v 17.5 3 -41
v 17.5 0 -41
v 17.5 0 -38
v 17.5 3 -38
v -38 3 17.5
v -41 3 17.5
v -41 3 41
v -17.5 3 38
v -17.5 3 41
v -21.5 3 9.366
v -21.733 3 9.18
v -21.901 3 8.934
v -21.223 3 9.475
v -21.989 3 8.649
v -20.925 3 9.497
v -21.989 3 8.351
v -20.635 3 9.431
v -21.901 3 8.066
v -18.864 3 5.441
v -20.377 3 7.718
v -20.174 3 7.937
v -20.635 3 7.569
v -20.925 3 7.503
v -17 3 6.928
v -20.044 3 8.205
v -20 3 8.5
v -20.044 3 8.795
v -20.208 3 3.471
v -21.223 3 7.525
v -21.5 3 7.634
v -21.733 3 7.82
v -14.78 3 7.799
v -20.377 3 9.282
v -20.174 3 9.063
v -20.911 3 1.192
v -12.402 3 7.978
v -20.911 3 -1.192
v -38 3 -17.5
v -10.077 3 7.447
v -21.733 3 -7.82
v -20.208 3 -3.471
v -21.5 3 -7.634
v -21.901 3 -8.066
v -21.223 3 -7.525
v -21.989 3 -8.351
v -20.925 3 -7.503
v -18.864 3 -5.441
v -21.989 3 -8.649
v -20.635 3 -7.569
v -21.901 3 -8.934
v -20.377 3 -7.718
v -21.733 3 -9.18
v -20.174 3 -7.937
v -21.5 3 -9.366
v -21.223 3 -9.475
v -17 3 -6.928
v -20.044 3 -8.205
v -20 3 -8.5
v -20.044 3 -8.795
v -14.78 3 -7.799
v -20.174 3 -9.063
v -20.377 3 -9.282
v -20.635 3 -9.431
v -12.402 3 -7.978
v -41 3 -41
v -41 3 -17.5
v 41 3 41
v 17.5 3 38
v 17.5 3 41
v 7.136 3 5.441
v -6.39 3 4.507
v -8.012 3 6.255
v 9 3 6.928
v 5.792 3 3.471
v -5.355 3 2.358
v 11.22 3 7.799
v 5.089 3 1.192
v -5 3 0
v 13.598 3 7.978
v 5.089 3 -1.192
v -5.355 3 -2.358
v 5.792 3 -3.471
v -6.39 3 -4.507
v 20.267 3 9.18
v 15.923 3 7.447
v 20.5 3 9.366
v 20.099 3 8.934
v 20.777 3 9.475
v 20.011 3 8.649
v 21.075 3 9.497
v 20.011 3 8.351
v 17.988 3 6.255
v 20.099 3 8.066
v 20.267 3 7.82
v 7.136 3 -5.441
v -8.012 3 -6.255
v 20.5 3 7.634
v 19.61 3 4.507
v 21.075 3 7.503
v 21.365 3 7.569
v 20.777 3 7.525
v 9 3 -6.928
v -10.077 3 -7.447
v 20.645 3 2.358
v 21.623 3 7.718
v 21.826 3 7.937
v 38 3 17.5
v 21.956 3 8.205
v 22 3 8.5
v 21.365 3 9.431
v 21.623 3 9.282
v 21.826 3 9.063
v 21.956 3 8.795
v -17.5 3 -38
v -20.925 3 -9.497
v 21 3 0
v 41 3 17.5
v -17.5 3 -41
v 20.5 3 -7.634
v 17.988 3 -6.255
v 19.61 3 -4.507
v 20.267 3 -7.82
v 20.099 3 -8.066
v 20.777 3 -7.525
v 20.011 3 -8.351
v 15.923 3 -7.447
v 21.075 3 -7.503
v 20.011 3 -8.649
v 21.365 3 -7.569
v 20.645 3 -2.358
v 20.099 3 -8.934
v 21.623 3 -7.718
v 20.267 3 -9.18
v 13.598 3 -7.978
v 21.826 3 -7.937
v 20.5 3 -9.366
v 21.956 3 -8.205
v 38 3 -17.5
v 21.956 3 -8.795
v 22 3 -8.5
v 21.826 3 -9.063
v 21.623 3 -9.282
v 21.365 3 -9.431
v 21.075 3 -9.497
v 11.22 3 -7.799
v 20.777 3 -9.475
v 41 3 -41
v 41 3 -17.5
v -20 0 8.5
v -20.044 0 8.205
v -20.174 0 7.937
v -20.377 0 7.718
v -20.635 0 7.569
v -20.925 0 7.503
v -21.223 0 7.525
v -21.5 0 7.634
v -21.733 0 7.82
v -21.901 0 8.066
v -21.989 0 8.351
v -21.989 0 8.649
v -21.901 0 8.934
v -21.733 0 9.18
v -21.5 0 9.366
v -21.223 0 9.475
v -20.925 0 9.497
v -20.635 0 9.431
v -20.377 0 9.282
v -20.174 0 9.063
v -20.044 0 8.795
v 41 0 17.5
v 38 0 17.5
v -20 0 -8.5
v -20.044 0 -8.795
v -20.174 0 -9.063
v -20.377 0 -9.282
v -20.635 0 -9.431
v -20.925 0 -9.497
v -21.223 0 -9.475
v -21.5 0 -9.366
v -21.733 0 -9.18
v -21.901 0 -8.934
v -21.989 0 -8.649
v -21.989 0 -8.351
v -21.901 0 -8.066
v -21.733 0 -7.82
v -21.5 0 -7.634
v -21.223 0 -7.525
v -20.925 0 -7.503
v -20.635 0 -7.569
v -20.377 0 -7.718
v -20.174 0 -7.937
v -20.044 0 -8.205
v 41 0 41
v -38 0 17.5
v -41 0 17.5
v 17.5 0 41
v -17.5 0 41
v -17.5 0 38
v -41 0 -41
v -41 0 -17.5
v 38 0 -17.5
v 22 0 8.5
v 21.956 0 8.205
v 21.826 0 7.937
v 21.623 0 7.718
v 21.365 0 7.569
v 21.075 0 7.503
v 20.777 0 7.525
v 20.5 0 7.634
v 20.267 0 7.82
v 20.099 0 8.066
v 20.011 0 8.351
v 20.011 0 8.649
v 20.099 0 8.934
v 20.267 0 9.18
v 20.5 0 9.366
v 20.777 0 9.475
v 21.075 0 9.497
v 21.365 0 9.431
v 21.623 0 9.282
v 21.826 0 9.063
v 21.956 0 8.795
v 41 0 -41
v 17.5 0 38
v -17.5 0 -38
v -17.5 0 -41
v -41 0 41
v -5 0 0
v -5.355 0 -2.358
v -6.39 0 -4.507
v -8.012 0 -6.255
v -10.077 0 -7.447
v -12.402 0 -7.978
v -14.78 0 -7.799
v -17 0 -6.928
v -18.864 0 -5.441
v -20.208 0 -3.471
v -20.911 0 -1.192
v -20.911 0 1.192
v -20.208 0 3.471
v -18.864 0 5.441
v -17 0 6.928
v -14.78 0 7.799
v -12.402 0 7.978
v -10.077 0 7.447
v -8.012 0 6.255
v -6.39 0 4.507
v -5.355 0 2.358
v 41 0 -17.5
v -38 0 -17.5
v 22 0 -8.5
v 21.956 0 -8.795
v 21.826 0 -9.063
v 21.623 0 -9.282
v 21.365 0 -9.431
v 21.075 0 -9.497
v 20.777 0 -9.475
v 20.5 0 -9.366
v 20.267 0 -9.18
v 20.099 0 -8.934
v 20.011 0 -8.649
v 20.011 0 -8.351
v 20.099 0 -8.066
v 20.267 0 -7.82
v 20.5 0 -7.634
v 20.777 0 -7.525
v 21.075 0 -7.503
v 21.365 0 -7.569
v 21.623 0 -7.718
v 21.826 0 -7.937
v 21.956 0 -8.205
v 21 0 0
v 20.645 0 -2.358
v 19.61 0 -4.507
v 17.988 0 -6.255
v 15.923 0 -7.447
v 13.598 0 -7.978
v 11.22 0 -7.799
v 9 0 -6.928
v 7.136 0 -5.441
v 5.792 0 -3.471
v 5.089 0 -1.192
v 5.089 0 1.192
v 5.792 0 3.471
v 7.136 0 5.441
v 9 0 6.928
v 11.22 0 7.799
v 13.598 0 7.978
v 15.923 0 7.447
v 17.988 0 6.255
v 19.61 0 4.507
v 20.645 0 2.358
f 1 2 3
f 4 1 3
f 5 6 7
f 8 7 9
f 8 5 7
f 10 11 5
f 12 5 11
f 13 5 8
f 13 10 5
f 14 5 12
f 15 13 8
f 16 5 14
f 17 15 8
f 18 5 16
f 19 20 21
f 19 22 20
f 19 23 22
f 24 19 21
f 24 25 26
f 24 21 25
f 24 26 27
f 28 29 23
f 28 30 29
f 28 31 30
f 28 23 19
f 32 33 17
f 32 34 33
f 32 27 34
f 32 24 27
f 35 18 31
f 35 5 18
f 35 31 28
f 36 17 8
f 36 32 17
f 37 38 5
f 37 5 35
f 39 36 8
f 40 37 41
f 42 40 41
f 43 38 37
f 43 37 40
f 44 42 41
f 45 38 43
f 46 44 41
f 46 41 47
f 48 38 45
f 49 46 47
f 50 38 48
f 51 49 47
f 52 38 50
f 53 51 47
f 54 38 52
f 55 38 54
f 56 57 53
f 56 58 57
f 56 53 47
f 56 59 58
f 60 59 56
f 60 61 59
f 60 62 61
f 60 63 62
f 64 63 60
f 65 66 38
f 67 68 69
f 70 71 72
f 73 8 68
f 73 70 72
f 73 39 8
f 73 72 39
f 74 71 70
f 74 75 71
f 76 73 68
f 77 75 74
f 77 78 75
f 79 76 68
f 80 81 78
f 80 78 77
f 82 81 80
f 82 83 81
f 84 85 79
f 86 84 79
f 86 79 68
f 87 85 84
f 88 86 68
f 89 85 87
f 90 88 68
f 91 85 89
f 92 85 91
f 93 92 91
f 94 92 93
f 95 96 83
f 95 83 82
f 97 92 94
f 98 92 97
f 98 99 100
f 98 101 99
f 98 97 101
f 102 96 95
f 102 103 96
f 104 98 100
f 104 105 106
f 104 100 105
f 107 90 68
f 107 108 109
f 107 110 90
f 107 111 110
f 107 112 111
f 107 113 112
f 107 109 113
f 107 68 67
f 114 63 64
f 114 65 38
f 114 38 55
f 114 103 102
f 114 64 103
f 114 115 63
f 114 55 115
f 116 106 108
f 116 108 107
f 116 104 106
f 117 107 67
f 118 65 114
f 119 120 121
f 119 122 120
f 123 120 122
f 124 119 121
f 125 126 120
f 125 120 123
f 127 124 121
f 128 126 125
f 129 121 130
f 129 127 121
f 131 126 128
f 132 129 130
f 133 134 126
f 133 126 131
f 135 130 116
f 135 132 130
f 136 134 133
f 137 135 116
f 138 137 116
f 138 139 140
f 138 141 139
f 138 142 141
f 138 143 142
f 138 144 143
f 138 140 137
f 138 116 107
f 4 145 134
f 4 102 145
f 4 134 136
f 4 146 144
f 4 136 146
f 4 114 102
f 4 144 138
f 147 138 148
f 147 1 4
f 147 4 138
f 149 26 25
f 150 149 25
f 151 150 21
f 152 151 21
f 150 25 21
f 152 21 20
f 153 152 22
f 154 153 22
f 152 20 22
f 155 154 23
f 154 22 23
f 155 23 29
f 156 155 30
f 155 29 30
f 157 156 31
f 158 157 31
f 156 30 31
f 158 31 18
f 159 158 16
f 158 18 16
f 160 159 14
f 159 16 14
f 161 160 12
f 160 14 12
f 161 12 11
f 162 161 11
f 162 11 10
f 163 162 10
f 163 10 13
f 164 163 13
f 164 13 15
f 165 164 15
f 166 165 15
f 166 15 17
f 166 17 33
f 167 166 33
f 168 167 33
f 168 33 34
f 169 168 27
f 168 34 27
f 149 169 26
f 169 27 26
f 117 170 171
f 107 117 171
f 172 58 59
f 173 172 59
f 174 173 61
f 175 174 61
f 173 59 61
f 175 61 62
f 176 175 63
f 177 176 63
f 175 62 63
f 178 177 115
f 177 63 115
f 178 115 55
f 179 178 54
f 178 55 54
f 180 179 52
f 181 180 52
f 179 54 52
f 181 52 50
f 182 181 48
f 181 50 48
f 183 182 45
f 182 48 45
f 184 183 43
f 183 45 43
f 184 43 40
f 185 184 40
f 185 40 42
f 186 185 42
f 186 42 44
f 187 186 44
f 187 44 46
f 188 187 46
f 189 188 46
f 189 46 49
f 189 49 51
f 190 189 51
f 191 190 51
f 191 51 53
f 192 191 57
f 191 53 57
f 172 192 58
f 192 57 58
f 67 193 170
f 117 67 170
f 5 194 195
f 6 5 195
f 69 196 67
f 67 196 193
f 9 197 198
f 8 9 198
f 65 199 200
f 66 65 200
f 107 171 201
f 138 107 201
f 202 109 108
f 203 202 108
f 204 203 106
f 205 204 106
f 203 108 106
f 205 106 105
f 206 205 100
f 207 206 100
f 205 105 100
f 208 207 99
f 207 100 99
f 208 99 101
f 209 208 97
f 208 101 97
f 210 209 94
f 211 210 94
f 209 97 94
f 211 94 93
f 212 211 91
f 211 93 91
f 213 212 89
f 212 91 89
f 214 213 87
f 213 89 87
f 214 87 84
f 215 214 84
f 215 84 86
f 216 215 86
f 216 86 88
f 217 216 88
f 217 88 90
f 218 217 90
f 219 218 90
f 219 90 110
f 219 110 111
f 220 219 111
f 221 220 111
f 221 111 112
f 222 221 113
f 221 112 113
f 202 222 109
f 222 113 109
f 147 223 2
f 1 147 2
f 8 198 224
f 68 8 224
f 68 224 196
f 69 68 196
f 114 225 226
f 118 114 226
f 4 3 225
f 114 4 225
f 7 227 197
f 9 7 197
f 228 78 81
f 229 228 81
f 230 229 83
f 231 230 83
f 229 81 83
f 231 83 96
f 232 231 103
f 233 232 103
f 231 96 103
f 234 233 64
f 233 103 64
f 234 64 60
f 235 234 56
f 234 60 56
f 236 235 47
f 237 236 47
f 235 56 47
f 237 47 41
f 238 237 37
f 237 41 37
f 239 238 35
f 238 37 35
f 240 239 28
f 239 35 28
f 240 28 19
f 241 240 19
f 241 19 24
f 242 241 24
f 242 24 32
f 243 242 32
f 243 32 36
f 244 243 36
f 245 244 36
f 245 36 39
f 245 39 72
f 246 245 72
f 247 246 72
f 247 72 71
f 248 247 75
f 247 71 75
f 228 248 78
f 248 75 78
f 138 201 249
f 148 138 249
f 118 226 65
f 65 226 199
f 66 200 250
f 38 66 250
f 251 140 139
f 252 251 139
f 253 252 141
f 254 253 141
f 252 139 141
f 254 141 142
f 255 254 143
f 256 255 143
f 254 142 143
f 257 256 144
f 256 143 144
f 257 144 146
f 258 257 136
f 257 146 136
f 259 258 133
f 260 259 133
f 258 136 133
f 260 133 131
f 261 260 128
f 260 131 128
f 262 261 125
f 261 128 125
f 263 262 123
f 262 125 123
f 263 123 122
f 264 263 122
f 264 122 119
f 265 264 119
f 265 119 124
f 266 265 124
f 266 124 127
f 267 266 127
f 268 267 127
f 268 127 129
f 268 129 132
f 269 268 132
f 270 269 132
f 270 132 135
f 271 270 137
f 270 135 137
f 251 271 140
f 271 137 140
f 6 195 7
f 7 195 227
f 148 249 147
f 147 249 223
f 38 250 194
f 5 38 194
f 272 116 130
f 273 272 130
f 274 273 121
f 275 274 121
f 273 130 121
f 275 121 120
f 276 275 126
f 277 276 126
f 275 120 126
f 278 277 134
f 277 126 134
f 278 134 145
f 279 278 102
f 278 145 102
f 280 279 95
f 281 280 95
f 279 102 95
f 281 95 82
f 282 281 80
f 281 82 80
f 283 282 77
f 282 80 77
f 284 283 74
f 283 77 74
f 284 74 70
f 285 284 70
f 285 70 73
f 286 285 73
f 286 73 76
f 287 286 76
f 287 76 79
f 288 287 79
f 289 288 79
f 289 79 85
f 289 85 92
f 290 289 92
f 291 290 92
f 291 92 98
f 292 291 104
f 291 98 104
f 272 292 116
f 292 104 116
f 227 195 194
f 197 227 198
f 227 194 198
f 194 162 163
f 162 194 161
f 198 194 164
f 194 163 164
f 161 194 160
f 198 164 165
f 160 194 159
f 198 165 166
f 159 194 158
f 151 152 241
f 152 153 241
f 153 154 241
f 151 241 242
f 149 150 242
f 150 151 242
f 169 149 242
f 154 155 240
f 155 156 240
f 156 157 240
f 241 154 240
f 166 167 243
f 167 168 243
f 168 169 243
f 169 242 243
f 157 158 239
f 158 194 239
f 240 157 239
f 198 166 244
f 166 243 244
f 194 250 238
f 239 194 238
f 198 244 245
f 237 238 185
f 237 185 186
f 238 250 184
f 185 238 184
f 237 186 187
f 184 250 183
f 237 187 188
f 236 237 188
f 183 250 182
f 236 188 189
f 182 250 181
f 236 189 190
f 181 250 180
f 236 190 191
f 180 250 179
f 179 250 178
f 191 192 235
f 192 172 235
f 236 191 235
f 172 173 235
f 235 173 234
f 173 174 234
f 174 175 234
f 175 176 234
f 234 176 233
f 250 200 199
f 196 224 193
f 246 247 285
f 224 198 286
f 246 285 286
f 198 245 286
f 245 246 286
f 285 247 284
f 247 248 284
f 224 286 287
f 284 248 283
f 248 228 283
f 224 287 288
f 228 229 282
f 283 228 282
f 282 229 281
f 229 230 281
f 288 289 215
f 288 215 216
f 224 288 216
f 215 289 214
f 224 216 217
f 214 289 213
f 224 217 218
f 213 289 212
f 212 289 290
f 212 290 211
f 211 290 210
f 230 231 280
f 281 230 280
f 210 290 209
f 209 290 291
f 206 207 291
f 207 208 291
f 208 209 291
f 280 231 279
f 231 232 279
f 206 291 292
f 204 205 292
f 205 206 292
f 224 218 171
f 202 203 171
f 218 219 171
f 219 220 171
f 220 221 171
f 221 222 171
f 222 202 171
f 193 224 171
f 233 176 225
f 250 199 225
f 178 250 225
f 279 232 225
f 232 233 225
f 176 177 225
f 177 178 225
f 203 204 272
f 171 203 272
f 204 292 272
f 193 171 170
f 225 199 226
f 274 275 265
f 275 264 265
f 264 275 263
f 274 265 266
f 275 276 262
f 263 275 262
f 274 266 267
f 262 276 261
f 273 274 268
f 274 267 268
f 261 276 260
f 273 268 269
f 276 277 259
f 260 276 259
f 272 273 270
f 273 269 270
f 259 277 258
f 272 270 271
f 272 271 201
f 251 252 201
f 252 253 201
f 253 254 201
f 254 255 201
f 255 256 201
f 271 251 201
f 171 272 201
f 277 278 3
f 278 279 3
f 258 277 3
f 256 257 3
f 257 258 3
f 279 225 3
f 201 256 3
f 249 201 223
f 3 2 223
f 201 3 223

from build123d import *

# Parameters (mm, degrees)
BOSS_EXTRUDE1_DEPTH = 3
SKETCH2_R           = 8
SKETCH2_R_2         = 1
CUT_EXTRUDE1_DEPTH  = 3


with BuildPart() as part:
    # Sketch1 → Boss-Extrude1 (new body)
    with BuildSketch(Plane(origin=(0, 0, 0), x_dir=(1, 0, 0), z_dir=(0, 1, 0))):
        Polygon((-41, -41), (-17.5, -41), (-17.5, -38), (17.5, -38), (17.5, -41), (41, -41), (41, -17.5), (38, -17.5), (38, 17.5), (41, 17.5), (41, 41), (17.5, 41), (17.5, 38), (-17.5, 38), (-17.5, 41), (-41, 41), (-41, 17.5), (-38, 17.5), (-38, -17.5), (-41, -17.5), align=None)
    extrude(amount=BOSS_EXTRUDE1_DEPTH)

    # Sketch2 → Cut-Extrude1 (cut)
    with BuildSketch(Plane(origin=(0, 3, 0), x_dir=(1, 0, 0), z_dir=(0, 1, 0))):
        with Locations((-13, 0)):
            Circle(SKETCH2_R)
        with Locations((-21, 8.5)):
            Circle(SKETCH2_R_2)
        with Locations((-21, -8.5)):
            Circle(SKETCH2_R_2)
        with Locations((21, -8.5)):
            Circle(SKETCH2_R_2)
        with Locations((21, 8.5)):
            Circle(SKETCH2_R_2)
        with Locations((13, 0)):
            Circle(SKETCH2_R)
    extrude(amount=-CUT_EXTRUDE1_DEPTH, mode=Mode.SUBTRACT)


solid = part.part
